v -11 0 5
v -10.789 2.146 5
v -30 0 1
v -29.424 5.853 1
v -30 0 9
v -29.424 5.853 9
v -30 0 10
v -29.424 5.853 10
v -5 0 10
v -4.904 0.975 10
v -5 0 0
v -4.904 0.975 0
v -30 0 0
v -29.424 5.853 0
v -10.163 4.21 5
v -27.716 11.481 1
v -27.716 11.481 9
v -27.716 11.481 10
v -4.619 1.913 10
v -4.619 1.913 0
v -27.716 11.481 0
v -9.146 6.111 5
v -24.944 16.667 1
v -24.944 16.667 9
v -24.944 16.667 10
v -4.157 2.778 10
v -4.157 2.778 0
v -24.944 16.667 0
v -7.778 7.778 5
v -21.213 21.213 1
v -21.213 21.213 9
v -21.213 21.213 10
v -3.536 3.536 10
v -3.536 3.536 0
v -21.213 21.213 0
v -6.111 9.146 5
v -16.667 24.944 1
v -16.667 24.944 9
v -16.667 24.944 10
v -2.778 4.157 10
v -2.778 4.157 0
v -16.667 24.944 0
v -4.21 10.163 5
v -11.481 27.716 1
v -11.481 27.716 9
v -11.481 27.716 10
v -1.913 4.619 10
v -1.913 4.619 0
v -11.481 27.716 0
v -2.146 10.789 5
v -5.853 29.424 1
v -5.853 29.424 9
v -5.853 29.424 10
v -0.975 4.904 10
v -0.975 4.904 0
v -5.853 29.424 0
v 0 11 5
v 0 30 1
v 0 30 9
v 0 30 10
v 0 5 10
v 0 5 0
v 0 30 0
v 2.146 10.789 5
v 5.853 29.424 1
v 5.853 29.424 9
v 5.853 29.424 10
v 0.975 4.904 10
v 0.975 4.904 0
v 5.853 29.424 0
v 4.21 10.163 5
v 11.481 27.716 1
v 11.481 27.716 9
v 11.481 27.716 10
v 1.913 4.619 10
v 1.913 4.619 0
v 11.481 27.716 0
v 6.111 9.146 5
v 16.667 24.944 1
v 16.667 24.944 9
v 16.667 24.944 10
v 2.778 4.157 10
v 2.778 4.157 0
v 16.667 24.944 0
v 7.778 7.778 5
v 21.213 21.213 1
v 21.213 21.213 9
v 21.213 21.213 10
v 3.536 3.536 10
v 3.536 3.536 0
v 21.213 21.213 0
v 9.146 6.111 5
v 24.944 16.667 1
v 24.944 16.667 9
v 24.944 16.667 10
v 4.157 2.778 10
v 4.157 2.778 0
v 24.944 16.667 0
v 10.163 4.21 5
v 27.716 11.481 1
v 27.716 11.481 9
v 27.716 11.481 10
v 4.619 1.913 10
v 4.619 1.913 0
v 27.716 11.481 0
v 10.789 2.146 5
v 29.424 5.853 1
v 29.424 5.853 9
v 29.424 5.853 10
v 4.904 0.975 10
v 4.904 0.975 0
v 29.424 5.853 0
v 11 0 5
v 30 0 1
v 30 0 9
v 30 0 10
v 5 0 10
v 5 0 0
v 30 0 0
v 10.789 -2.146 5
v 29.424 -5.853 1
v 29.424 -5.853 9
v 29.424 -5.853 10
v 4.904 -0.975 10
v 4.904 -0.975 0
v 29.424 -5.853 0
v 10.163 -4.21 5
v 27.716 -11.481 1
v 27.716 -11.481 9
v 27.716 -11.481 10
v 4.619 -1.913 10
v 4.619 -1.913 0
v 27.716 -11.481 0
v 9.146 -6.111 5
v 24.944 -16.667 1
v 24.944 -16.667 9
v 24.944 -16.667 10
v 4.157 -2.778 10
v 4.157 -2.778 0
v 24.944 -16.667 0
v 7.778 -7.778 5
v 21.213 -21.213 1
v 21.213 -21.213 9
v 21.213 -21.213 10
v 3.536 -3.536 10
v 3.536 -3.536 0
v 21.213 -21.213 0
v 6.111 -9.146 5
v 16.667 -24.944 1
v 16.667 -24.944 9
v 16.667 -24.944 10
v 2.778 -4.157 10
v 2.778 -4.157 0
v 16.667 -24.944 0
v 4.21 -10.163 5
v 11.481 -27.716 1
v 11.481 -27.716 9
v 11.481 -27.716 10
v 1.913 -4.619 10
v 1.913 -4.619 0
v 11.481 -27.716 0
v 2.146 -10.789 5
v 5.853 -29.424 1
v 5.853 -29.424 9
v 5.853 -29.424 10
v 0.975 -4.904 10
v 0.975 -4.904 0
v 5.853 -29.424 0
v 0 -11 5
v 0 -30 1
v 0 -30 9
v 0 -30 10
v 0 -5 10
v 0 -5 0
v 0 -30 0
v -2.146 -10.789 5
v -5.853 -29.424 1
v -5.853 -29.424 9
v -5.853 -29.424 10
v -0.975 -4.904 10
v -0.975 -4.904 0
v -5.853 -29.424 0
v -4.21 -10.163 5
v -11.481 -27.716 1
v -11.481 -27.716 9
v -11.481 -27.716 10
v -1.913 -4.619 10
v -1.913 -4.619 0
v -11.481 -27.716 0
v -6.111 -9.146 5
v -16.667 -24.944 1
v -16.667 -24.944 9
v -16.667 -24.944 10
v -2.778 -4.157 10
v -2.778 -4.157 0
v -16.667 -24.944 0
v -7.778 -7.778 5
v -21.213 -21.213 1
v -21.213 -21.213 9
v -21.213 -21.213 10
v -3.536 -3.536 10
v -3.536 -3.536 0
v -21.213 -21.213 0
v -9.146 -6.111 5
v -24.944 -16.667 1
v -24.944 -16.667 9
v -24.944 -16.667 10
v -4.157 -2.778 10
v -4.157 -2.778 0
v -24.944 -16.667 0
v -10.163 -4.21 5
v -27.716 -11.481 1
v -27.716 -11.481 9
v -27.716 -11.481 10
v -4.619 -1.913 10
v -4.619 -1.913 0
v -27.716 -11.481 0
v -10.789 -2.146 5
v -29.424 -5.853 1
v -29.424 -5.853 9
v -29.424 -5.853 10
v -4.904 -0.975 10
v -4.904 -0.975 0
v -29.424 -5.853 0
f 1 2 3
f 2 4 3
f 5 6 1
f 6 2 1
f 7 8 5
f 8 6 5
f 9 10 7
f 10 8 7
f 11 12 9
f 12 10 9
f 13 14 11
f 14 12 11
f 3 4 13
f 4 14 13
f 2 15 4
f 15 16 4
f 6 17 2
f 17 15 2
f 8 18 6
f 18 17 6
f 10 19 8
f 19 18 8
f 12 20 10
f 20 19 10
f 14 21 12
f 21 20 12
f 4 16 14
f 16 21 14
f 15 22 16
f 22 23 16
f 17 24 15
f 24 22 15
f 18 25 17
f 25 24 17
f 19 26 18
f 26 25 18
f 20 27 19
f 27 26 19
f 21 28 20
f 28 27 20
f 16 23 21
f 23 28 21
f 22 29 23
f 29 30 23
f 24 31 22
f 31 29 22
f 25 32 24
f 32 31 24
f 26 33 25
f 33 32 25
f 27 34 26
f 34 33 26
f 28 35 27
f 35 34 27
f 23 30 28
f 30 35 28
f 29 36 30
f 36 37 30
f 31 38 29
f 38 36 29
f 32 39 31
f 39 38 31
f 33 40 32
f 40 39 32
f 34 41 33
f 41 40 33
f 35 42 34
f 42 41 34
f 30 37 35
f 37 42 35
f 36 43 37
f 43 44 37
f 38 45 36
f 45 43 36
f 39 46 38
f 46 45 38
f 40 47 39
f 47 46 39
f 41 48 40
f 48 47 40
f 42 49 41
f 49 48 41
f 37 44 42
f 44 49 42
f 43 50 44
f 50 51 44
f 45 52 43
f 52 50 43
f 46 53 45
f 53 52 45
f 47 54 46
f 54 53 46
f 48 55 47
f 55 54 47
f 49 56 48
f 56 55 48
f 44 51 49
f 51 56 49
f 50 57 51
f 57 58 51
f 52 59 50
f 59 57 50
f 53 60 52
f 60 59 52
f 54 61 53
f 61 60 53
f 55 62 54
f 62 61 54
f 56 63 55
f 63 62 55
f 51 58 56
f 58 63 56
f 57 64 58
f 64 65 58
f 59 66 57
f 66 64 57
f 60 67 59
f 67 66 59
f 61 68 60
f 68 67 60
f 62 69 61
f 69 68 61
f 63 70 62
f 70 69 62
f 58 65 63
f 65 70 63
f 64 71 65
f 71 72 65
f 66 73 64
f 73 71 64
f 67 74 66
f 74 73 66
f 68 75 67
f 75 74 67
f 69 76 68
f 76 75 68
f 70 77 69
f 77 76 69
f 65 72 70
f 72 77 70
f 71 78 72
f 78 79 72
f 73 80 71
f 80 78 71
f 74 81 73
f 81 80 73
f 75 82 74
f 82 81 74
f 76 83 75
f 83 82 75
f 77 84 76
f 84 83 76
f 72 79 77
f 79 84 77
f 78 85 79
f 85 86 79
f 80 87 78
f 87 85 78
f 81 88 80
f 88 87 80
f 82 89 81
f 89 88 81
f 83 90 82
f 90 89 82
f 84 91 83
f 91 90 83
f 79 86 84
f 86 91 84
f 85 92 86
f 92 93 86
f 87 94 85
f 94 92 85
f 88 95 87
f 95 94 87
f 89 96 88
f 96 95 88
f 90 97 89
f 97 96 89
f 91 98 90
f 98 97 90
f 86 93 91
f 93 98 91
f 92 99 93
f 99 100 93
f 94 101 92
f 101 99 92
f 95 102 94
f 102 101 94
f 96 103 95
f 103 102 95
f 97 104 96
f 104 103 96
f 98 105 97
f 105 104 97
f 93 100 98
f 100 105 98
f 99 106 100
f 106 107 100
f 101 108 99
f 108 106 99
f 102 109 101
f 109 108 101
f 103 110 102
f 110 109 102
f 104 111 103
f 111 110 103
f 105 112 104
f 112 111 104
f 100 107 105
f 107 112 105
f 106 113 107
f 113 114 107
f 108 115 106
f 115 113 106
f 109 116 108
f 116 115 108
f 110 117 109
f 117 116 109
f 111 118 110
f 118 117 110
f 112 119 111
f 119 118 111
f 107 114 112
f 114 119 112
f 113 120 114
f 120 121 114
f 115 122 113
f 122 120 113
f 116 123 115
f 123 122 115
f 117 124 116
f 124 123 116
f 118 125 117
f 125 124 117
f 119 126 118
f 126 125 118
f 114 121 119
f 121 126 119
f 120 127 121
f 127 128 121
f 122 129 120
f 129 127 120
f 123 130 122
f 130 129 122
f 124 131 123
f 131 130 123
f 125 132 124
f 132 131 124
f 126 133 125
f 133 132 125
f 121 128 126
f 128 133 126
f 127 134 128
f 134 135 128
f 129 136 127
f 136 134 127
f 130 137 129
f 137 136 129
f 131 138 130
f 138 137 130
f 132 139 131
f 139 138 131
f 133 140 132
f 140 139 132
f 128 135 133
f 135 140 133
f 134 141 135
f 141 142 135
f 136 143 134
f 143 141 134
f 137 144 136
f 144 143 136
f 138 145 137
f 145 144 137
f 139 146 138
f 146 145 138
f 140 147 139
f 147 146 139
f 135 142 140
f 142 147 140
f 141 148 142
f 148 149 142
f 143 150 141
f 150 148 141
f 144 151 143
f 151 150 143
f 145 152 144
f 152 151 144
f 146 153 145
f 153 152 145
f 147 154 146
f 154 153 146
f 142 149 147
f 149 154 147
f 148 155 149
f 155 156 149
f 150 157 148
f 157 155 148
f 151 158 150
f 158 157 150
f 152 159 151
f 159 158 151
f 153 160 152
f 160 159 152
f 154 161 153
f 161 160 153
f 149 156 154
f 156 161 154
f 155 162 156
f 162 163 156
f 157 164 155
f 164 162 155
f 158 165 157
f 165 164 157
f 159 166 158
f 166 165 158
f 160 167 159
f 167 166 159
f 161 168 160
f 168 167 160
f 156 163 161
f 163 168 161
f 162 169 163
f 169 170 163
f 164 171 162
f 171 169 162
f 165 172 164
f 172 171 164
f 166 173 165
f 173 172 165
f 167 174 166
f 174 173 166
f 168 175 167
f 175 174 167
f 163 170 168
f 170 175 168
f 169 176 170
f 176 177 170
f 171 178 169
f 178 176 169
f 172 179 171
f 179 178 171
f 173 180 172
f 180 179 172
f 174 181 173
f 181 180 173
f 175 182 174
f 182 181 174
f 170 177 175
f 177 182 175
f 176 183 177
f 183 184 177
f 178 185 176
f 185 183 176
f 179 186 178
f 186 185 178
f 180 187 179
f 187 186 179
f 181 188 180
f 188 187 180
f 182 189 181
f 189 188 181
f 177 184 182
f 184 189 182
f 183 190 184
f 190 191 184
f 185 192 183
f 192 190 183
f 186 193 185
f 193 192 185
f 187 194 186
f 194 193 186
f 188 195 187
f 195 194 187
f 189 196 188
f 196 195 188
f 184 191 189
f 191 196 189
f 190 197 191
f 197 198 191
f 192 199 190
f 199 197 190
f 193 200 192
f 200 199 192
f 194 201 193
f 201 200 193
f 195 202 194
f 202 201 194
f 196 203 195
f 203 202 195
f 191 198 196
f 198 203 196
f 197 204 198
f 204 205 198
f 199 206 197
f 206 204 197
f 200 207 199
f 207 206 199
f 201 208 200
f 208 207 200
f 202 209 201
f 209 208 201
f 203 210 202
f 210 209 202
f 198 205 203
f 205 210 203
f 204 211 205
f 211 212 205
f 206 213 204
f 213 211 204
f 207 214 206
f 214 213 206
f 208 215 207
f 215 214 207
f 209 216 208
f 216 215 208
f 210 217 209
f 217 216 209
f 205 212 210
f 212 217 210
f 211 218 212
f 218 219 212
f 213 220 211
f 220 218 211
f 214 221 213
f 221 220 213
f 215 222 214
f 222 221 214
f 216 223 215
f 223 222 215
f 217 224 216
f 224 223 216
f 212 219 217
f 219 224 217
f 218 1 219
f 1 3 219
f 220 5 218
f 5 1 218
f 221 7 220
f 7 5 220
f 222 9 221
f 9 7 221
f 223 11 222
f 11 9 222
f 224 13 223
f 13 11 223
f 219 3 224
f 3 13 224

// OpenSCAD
$fn = 32;

// ----------------------------------------------------------------------
// Revolved part: V-groove pulley R30
// ----------------------------------------------------------------------

// --- parameters (mm) ---
bore_r = 5;               // bore radius
rim_r = 30;               // rim radius
rim_t = 10;               // rim width
groove_r = 11;            // groove root radius
groove_w = 4;             // groove half width
revolve_angle = 360;      // revolve sweep, degrees

bore_d = 2 * bore_r;
rim_d = 2 * rim_r;
groove_d = 2 * groove_r;

profile = [[5, 0], [30, 0], [30, 1], [11, 5], [30, 9], [30, 10], [5, 10]];  // primary outline, 7 points, counter clockwise

// --- the one profile operation ---
rotate_extrude(angle = revolve_angle) polygon(points = profile);
